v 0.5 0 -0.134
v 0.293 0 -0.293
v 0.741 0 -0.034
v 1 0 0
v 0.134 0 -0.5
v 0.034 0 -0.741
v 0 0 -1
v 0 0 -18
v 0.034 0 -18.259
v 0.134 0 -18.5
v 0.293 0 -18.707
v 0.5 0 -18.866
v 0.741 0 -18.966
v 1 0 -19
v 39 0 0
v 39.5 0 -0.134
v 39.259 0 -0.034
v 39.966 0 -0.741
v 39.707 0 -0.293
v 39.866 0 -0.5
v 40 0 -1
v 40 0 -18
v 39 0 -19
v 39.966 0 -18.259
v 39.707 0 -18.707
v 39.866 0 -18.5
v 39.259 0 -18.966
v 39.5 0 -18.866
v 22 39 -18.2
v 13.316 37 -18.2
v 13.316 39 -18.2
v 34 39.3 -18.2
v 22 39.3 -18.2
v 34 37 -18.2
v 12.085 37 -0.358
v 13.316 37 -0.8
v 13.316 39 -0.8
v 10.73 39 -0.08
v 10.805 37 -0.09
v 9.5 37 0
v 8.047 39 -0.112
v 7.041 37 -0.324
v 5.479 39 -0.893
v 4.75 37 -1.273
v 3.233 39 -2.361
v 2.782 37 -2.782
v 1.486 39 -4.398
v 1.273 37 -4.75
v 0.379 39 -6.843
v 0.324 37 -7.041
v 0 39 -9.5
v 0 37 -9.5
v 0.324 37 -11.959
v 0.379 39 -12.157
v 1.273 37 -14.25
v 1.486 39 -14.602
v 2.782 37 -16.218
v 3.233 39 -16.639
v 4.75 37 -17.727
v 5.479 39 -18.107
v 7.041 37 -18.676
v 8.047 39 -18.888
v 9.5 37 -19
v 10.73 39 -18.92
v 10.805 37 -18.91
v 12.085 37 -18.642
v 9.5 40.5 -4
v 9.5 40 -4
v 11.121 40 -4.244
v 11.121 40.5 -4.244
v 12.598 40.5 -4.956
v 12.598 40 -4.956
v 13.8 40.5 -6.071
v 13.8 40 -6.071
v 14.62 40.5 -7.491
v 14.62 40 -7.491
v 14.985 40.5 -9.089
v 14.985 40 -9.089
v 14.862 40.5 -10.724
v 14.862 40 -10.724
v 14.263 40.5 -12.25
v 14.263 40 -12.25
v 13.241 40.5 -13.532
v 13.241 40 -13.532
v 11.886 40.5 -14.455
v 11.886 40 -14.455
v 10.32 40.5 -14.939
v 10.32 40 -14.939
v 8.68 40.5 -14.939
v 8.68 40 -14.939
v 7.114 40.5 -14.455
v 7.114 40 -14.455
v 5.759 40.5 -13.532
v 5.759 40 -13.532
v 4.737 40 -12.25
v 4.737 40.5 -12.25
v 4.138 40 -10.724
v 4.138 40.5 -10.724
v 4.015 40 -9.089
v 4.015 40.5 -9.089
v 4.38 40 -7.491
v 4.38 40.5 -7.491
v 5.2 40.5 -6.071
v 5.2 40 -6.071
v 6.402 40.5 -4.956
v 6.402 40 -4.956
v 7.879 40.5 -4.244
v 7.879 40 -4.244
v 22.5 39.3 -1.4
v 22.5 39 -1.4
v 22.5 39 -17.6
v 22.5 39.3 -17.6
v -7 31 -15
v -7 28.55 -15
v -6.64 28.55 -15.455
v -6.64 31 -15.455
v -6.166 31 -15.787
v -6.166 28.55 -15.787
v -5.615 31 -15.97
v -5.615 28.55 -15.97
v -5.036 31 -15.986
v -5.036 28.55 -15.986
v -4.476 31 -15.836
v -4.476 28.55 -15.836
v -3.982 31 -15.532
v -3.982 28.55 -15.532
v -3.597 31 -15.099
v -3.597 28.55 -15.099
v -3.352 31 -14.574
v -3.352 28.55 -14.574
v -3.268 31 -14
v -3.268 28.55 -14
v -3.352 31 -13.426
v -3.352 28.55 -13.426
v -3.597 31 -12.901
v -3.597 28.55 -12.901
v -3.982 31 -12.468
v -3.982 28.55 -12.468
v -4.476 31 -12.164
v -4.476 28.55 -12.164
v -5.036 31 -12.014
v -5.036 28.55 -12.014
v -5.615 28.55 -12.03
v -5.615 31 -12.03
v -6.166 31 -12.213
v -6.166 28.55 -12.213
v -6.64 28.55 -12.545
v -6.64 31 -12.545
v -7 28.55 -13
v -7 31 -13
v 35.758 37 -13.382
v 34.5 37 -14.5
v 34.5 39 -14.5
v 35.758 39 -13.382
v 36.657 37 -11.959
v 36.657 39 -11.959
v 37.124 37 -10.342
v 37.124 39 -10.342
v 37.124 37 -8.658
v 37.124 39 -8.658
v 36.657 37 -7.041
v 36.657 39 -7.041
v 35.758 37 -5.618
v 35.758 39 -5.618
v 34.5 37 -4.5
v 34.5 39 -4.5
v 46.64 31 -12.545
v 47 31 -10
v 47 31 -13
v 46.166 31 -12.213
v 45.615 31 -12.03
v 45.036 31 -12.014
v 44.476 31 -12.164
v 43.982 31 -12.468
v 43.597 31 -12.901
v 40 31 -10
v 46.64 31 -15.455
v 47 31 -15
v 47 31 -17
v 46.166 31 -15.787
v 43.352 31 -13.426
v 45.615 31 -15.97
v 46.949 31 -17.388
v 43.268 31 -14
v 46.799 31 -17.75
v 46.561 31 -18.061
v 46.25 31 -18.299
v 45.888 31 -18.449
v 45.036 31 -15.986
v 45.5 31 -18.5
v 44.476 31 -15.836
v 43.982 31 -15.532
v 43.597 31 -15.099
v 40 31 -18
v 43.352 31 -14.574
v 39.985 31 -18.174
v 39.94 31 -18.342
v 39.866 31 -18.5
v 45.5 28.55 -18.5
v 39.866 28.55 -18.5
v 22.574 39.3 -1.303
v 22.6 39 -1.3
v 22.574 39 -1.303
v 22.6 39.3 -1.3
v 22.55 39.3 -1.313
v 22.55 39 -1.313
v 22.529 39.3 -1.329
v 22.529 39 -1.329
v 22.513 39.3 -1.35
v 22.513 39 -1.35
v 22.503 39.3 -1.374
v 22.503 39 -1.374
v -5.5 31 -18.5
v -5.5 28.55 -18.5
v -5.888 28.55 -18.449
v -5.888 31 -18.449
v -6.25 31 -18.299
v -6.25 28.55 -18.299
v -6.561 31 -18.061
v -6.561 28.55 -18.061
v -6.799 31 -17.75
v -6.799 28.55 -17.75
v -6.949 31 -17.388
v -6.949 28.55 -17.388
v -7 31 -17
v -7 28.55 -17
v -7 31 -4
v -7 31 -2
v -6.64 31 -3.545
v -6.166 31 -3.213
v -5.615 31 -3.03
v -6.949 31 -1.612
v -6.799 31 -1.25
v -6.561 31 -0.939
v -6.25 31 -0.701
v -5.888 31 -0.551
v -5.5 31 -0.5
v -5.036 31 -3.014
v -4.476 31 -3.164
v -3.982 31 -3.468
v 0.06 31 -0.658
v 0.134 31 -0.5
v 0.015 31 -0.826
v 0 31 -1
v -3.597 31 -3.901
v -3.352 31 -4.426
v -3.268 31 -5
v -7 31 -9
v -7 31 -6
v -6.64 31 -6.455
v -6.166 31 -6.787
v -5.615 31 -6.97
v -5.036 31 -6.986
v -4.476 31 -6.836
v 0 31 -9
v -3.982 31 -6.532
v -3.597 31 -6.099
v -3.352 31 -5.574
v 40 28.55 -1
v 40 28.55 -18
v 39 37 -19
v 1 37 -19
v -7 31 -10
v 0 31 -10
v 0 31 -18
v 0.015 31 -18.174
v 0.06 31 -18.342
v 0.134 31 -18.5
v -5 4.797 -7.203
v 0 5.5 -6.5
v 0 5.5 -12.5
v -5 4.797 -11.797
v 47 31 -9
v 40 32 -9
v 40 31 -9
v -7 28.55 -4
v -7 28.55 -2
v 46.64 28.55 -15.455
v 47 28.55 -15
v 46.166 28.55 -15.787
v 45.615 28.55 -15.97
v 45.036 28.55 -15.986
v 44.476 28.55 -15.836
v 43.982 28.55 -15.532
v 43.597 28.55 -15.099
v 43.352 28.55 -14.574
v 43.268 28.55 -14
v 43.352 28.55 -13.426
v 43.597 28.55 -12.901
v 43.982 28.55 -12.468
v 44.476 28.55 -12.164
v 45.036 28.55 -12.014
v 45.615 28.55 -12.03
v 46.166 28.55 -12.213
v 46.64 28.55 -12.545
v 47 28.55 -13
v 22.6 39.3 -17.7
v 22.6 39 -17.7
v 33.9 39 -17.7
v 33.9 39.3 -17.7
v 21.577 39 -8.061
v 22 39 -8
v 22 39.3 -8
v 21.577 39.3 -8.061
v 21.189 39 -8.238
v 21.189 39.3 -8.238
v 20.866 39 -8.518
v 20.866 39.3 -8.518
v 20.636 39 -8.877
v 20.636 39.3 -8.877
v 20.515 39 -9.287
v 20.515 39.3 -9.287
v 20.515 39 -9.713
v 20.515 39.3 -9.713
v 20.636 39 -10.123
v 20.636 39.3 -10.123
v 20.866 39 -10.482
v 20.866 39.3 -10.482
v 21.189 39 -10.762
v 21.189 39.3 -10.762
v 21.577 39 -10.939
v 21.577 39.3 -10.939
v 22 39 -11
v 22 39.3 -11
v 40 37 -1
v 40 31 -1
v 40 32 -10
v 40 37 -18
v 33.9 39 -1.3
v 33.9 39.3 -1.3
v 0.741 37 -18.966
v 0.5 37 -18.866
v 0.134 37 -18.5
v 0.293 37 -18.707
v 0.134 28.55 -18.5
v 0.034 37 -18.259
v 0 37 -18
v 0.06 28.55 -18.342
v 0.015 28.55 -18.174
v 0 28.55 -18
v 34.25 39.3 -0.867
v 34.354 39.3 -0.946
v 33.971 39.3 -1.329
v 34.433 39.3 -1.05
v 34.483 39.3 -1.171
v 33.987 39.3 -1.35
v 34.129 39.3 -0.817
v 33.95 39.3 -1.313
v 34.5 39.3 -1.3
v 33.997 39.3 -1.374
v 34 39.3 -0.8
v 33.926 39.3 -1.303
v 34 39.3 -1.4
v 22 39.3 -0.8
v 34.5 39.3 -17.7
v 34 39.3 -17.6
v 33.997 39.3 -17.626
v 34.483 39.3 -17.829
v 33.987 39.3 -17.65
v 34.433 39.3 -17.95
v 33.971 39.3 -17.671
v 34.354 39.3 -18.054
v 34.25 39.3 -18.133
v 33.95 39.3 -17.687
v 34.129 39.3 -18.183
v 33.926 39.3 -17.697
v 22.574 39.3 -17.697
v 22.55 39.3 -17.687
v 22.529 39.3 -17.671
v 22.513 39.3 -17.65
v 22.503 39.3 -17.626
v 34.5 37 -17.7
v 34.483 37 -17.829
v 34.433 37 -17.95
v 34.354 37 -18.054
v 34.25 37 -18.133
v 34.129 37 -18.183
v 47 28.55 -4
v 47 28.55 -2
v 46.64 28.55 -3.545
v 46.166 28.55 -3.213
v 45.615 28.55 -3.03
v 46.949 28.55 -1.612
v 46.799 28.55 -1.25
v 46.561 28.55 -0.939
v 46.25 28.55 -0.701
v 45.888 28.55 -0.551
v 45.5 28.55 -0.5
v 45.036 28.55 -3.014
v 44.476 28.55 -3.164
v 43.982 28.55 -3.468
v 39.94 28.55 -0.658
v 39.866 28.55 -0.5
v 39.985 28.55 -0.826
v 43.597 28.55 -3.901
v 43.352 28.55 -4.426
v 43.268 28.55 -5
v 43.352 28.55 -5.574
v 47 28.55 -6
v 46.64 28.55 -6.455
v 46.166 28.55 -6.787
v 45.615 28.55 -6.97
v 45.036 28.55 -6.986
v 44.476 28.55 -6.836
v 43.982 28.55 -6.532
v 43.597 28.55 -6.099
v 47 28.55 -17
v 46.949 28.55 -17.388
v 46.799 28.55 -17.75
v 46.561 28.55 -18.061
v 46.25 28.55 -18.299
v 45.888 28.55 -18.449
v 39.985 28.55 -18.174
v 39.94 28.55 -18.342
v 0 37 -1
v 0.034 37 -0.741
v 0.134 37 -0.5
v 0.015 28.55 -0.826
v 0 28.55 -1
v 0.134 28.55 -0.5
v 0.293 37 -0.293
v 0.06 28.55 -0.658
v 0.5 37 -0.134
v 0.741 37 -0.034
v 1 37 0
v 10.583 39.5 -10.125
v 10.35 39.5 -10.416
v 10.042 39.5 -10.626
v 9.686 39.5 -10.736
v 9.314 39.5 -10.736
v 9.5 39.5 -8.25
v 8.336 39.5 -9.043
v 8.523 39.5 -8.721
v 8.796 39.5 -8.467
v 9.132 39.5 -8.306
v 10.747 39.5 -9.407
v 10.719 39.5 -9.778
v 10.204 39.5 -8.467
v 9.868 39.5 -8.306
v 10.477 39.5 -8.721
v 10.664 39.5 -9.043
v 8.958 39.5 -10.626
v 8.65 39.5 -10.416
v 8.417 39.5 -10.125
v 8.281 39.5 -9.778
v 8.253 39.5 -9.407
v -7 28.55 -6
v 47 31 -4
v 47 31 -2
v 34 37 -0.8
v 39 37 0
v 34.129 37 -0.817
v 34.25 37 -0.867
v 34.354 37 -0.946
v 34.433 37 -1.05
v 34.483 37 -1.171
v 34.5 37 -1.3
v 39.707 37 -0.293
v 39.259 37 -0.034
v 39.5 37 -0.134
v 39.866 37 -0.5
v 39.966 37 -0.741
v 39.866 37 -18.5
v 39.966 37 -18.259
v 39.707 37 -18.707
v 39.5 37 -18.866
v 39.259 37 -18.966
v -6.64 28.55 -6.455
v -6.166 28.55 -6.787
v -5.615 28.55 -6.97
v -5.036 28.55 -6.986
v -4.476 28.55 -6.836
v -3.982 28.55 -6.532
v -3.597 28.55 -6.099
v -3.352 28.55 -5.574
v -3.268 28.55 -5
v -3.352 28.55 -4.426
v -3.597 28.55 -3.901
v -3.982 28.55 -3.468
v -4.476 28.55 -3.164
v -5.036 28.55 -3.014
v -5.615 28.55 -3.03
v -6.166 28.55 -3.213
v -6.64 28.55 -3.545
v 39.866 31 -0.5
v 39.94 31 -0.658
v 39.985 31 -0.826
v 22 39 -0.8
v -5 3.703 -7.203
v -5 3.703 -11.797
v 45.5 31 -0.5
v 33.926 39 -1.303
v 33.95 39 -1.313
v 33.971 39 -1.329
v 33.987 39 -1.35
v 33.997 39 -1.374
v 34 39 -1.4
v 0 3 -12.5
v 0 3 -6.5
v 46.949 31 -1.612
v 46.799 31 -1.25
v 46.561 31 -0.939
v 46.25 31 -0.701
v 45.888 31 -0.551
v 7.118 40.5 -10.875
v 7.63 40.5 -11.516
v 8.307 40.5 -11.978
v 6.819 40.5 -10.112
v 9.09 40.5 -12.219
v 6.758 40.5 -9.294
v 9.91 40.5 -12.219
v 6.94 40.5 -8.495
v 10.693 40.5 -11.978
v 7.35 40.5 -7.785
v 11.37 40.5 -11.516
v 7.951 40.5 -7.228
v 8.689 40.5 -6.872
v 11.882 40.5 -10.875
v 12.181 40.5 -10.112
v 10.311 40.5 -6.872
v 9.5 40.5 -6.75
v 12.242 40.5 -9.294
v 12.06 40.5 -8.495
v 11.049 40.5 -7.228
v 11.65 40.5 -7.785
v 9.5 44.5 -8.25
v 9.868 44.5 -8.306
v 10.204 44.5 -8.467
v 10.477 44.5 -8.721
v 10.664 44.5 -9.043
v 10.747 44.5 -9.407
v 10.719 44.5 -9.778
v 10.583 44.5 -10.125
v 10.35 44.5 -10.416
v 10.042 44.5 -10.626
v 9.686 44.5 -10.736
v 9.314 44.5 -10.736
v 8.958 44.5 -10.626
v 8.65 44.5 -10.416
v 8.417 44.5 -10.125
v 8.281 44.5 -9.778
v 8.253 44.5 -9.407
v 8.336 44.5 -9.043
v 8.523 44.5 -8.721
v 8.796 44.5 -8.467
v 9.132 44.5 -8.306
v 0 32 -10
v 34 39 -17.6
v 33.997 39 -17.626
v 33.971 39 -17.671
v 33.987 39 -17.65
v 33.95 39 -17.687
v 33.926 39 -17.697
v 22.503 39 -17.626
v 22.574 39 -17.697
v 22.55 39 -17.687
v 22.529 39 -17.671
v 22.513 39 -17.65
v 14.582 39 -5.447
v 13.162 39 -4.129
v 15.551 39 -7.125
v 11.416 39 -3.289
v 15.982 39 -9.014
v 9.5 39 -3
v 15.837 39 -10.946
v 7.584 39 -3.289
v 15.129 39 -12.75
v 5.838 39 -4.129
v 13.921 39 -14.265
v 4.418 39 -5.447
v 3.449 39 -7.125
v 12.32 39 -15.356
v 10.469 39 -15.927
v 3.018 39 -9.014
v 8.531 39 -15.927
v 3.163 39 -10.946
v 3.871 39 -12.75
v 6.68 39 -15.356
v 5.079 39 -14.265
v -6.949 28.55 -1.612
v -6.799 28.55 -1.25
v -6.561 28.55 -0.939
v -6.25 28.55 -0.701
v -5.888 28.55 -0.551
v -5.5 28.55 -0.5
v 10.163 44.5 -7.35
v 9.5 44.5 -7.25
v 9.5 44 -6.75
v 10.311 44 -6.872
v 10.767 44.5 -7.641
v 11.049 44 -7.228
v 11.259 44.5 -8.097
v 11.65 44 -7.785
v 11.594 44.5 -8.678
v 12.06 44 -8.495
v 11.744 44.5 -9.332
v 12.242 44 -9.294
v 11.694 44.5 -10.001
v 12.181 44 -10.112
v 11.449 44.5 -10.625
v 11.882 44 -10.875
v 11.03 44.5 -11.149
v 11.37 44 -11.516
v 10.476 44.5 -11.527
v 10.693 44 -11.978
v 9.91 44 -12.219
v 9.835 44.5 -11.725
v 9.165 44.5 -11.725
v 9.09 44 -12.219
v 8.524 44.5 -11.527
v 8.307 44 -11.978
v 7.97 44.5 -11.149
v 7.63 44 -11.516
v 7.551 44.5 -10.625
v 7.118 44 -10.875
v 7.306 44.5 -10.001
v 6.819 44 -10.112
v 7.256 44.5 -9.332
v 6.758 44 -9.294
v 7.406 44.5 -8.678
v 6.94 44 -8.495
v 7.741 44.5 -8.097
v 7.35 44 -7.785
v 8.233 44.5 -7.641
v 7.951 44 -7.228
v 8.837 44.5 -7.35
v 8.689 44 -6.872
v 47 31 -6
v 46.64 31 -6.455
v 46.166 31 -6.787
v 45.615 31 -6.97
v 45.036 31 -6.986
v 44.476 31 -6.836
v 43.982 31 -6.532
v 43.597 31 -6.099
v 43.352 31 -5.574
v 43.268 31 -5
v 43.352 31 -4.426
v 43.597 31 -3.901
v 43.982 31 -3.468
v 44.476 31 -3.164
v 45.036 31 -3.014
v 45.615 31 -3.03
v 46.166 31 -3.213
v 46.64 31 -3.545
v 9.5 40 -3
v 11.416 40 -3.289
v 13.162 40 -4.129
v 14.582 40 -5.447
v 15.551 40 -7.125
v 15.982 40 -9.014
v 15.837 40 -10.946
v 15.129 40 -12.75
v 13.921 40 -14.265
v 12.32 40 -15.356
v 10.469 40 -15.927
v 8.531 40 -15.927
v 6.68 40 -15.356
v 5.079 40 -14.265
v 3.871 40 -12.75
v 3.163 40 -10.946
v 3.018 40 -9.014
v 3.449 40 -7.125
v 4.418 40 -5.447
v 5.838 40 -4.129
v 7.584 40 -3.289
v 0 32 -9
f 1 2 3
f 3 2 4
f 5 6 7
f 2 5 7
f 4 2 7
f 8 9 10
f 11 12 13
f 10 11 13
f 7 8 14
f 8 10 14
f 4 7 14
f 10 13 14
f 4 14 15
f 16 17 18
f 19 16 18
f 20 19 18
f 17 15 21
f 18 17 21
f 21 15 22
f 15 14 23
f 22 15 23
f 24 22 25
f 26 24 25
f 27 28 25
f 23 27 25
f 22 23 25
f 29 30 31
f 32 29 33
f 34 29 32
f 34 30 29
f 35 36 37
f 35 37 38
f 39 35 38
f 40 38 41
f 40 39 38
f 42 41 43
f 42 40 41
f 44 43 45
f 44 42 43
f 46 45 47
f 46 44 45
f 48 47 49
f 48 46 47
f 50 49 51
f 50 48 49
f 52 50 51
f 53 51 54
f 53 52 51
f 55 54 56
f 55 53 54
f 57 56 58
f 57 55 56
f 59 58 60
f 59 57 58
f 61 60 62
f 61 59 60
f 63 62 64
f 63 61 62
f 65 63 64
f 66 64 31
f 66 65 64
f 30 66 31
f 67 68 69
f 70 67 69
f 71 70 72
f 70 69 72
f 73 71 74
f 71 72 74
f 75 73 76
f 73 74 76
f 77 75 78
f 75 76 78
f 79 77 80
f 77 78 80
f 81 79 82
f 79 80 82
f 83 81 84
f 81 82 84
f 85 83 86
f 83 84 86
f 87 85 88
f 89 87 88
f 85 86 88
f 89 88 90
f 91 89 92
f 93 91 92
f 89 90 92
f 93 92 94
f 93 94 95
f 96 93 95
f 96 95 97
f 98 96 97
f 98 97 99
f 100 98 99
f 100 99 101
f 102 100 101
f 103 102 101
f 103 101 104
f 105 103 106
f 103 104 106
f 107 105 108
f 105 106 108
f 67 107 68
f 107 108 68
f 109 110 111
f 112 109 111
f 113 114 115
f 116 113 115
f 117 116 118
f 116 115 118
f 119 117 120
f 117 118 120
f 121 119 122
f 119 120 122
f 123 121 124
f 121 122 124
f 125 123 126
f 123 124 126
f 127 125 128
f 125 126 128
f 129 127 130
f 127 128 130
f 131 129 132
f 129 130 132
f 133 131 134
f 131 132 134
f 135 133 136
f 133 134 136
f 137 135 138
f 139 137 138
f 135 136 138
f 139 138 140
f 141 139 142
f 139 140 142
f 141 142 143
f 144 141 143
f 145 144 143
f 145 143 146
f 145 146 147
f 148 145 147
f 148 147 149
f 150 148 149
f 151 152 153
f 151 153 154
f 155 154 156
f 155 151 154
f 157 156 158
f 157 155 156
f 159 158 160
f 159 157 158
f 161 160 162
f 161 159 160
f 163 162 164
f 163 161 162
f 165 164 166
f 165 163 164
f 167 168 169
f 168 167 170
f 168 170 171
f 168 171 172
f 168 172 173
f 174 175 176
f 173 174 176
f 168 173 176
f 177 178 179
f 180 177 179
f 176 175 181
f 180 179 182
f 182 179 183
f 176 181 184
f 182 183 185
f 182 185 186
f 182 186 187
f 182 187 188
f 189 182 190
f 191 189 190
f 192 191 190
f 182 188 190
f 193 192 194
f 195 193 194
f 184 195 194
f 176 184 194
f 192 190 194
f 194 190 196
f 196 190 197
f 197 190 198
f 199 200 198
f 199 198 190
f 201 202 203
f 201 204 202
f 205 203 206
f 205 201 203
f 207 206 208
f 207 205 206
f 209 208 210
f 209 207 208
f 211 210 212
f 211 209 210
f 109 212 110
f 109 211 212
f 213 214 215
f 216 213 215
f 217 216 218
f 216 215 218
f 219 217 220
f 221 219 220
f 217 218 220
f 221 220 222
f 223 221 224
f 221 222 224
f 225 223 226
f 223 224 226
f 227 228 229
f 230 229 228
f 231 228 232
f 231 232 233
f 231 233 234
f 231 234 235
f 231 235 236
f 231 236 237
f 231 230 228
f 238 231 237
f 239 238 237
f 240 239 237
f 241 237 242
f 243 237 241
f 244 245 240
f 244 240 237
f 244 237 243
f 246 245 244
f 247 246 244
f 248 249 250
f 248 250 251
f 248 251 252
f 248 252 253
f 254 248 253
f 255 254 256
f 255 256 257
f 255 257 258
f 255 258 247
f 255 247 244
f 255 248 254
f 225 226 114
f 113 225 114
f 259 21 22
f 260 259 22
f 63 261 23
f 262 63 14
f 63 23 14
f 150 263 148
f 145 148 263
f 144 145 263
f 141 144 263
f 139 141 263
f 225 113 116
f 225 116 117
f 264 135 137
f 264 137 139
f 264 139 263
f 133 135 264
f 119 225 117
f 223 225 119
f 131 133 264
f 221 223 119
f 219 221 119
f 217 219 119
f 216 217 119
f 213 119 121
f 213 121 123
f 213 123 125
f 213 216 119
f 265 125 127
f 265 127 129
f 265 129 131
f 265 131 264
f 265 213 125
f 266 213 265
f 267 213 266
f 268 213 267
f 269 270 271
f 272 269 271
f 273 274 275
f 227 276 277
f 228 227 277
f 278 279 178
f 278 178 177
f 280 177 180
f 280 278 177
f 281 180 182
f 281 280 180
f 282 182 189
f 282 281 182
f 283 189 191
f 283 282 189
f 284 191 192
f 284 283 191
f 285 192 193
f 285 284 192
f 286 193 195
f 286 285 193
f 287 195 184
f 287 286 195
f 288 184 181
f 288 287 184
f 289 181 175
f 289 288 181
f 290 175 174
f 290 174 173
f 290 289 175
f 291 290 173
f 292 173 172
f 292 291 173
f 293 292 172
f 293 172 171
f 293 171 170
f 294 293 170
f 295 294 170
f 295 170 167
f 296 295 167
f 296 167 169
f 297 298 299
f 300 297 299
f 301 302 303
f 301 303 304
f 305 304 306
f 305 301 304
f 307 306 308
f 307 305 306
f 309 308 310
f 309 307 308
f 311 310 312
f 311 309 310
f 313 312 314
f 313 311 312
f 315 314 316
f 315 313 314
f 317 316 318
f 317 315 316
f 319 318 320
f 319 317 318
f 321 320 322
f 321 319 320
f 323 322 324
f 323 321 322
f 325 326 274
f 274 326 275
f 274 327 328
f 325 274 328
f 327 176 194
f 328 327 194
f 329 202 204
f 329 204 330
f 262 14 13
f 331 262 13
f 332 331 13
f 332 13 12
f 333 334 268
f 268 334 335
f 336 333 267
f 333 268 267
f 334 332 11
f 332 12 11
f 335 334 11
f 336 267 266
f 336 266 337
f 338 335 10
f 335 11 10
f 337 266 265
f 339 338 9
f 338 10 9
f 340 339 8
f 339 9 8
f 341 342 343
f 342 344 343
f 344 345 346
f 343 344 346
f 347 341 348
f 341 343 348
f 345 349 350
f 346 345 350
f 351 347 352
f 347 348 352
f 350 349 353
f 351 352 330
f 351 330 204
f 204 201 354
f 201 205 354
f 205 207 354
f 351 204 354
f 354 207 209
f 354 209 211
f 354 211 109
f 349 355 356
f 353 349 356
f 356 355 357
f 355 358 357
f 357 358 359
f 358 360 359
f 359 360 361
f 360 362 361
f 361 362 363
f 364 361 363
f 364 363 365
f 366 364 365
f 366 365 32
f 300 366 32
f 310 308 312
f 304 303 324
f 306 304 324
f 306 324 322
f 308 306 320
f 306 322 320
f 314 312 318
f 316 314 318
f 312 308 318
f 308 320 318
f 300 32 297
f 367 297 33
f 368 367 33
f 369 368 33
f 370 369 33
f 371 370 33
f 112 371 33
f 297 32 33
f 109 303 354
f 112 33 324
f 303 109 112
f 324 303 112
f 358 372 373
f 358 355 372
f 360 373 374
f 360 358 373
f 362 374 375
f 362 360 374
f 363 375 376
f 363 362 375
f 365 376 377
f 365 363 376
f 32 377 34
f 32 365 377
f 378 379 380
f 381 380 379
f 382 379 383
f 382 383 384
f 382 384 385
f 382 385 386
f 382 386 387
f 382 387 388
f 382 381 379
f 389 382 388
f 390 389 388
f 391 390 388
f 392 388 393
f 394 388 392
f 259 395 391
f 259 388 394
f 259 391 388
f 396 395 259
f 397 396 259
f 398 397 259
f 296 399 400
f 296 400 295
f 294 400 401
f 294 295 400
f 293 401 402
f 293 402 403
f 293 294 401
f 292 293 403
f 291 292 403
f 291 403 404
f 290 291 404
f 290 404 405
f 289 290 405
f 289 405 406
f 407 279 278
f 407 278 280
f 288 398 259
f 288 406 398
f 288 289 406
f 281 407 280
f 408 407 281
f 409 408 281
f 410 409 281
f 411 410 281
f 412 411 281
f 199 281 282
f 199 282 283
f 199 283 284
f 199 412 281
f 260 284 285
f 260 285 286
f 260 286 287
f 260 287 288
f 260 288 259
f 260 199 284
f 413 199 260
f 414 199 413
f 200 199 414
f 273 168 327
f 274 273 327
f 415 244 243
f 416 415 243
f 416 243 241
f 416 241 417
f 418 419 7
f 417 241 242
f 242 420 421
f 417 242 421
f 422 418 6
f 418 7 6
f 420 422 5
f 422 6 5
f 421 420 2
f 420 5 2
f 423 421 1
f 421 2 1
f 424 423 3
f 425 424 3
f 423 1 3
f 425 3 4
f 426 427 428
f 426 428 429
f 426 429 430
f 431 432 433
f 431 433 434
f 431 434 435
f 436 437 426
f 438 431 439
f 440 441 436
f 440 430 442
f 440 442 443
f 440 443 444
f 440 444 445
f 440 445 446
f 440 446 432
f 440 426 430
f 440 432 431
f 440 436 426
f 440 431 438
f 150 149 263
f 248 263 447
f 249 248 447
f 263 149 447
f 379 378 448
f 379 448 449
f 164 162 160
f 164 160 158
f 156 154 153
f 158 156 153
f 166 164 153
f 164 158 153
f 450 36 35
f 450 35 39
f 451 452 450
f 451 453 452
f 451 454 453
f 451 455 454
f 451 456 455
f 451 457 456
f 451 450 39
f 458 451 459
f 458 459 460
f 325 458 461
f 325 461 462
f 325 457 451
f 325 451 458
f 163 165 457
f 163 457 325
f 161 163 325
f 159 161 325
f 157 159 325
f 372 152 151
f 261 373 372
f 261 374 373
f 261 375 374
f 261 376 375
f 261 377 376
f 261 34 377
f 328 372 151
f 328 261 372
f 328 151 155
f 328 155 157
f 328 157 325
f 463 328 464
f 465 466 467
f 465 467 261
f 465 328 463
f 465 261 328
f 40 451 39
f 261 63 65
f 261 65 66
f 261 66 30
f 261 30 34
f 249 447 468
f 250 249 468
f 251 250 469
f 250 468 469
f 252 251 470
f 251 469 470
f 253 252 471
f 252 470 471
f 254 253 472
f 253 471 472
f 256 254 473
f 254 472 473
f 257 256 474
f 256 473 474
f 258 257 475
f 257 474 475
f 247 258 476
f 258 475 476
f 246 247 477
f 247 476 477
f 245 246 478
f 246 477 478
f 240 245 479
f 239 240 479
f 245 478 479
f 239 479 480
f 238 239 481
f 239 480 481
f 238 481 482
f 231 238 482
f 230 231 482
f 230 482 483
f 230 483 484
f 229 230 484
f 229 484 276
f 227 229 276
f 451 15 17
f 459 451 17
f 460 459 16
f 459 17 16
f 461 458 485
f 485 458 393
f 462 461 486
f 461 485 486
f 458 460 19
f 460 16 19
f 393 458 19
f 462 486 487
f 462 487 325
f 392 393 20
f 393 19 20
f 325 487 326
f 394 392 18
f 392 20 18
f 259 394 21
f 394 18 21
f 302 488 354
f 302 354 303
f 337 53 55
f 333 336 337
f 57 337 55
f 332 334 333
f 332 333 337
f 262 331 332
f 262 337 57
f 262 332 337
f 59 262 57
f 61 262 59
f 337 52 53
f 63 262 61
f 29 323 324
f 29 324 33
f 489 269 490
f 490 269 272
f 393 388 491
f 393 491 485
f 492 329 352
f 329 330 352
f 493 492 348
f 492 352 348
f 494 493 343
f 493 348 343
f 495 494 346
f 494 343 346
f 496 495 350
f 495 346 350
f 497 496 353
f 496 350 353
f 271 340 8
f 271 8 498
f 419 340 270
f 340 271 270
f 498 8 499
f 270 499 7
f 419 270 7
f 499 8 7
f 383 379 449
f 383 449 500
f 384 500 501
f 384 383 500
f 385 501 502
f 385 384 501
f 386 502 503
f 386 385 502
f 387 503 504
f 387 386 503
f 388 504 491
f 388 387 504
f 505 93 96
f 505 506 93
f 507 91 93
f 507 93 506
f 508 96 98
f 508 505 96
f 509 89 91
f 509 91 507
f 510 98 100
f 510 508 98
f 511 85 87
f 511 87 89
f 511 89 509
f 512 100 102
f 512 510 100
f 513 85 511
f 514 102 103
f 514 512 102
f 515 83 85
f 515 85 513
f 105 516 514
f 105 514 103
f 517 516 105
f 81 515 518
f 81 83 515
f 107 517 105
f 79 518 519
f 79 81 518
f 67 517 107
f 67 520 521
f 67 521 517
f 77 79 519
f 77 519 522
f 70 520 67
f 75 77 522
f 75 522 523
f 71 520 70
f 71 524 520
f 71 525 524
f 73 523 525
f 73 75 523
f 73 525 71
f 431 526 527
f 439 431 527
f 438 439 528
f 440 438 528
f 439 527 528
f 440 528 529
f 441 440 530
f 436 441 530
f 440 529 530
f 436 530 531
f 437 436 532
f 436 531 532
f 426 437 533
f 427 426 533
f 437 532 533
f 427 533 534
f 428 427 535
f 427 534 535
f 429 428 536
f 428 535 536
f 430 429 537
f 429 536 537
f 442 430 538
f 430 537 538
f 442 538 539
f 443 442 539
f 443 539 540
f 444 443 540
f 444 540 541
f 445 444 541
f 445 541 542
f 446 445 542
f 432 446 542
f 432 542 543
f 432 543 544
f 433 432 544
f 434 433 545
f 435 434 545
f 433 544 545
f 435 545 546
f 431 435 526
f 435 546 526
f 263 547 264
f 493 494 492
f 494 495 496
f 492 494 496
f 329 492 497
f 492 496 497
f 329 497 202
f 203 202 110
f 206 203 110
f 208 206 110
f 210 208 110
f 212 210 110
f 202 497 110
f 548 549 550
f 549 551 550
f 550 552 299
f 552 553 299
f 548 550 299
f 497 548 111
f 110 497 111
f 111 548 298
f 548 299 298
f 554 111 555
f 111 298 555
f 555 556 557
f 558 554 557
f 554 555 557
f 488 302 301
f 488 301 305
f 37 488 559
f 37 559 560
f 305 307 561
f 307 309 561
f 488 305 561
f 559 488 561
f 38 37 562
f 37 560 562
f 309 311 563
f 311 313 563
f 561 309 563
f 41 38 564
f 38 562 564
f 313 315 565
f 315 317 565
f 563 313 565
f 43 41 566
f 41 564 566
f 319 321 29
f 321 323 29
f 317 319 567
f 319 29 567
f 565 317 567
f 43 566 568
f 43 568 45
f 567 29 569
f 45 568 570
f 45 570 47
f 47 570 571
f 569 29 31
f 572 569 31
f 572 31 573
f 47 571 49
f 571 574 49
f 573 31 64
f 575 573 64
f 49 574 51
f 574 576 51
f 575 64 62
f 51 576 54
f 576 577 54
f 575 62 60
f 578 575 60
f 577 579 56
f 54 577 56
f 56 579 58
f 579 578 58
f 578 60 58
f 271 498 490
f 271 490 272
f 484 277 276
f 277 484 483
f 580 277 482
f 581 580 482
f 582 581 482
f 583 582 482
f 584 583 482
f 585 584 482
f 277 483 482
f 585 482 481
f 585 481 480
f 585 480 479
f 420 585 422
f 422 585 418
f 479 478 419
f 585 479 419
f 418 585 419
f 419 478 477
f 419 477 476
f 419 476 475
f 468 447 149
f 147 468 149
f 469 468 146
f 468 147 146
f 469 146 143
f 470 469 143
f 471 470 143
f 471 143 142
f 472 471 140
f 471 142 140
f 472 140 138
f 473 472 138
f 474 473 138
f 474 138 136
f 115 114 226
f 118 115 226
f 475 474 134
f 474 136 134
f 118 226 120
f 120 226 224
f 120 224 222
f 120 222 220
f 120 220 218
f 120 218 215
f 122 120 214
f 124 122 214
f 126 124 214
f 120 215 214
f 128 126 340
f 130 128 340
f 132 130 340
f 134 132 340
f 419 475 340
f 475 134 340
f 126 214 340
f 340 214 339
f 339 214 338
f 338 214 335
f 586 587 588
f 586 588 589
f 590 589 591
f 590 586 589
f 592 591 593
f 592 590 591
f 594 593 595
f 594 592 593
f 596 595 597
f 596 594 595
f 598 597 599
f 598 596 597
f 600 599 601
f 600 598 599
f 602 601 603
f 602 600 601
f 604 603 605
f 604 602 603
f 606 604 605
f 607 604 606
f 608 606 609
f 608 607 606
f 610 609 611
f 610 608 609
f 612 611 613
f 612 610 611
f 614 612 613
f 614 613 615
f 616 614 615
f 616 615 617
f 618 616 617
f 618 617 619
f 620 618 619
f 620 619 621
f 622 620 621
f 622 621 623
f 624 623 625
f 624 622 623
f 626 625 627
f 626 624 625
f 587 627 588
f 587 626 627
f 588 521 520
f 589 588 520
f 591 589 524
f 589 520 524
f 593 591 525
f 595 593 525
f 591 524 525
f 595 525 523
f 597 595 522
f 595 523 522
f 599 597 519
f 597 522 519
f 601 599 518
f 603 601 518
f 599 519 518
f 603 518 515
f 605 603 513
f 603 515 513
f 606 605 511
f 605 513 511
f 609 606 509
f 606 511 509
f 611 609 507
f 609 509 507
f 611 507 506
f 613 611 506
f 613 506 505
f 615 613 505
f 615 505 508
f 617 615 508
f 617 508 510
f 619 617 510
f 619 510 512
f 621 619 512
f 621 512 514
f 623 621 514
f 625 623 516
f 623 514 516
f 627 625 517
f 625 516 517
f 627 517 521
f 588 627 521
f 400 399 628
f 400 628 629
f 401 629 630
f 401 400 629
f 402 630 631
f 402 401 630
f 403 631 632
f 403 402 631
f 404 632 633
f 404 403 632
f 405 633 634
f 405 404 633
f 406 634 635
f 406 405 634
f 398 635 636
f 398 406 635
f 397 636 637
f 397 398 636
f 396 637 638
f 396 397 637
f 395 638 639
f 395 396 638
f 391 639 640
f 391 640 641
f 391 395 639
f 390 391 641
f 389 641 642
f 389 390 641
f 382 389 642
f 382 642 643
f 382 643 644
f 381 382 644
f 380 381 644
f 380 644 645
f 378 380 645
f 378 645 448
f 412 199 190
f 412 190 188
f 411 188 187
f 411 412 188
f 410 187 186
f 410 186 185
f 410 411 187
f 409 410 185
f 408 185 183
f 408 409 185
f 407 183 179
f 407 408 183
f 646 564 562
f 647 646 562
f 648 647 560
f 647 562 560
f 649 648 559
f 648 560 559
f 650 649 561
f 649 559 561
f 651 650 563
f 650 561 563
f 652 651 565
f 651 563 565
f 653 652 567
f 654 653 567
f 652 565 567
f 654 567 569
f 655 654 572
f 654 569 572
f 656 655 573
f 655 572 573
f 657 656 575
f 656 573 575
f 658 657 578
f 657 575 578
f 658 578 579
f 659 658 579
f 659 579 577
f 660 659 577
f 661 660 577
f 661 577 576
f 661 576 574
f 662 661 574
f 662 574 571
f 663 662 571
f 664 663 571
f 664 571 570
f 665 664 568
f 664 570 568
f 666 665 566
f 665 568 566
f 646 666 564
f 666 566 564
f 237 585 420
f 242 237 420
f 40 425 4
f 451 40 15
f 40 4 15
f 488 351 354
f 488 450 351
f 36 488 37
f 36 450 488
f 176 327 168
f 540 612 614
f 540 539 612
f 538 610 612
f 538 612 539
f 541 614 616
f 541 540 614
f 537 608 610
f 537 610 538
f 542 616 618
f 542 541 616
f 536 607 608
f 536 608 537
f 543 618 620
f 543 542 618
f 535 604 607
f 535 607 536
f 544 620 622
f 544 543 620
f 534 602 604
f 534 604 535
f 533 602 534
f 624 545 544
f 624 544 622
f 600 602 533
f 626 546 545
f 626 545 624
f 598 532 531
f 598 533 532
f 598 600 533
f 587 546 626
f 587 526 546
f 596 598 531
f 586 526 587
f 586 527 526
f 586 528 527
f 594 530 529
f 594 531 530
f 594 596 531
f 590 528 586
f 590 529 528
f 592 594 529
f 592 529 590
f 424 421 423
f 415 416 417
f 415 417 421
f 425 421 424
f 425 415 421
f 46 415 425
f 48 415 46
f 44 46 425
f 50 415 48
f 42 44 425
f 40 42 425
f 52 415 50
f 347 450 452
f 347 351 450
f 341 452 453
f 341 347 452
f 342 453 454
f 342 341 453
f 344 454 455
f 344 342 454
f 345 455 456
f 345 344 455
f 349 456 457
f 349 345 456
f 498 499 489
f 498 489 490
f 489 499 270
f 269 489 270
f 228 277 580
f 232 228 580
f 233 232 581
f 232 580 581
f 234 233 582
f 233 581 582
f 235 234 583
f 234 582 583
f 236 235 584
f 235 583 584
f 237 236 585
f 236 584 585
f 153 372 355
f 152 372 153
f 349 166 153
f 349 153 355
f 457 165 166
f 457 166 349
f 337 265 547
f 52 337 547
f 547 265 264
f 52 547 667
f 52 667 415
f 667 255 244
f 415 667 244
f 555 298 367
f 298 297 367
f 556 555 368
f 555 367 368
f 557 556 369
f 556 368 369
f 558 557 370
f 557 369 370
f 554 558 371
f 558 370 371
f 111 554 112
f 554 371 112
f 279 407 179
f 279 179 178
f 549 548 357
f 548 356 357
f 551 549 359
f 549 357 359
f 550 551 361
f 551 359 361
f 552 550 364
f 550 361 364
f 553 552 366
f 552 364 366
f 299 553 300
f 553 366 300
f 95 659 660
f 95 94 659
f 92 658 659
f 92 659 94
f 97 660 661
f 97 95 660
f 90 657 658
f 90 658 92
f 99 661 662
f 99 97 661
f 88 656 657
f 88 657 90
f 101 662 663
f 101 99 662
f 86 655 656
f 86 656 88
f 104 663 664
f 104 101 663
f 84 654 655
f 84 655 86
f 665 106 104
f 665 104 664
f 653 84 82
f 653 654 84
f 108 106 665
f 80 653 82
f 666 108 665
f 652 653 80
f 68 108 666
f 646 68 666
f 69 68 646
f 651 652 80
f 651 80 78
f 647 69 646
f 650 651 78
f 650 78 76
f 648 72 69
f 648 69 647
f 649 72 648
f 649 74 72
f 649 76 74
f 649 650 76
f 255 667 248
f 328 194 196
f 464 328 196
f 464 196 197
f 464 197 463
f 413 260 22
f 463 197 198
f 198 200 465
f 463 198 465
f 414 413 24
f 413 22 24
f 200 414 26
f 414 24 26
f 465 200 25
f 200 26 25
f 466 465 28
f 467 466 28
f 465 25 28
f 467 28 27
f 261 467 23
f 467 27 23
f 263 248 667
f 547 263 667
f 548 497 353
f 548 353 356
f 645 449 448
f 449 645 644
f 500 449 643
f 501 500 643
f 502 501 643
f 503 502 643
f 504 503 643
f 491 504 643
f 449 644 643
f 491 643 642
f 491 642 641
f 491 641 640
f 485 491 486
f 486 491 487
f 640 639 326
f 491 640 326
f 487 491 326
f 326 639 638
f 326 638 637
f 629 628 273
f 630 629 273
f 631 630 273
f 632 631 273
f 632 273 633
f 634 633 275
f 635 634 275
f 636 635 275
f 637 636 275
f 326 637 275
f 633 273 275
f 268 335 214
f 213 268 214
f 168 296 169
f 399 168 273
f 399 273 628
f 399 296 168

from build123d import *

# Parameters (mm, degrees)
SALIENTE_EXTRUIR1_DEPTH = 37
SALIENTE_EXTRUIR2_DEPTH = 2
CROQUIS3_R              = 6.5
SALIENTE_EXTRUIR3_DEPTH = 1
CROQUIS4_R              = 5.5
SALIENTE_EXTRUIR4_DEPTH = 0.5
CROQUIS5_R              = 2.75
SALIENTE_EXTRUIR5_DEPTH = 4
CROQUIS7_W              = 11.5
CROQUIS7_H              = 16.4
SALIENTE_EXTRUIR6_DEPTH = 0.3
REDONDEO1_R             = 0.1
REDONDEO2_R             = 0.5
SALIENTE_EXTRUIR7_START = -8.45
SALIENTE_EXTRUIR7_DEPTH = 2.45
SALIENTE_EXTRUIR8_DEPTH = 0.5
CROQUIS11_W             = 6
CROQUIS11_H             = 2.5
SALIENTE_EXTRUIR9_DEPTH = 5
SALIENTE_EXTRUIR9_DRAFT = -8
CROQUIS12_R             = 1.25
CORTAR_EXTRUIR1_DEPTH   = 5
CHAFL_N1_SIZE           = 0.5


with BuildPart() as part:
    # Croquis1 → Saliente-Extruir1 (new body)
    with BuildSketch(Plane(origin=(0, 0, 0), x_dir=(1, 0, 0), z_dir=(0, 1, 0))):
        with BuildLine():
            Line((1, 0), (39, 0))
            ThreePointArc((39, 0), (39.707106781, 0.292893219), (40, 1))
            Line((40, 1), (40, 18))
            ThreePointArc((40, 18), (39.707106781, 18.707106781), (39, 19))
            Line((39, 19), (1, 19))
            ThreePointArc((1, 19), (0.292893219, 18.707106781), (0, 18))
            Line((0, 18), (0, 1))
            ThreePointArc((0, 1), (0.292893219, 0.292893219), (1, 0))
        make_face()
    extrude(amount=SALIENTE_EXTRUIR1_DEPTH)

    # Croquis2 → Saliente-Extruir2 (add)
    with BuildSketch(Plane(origin=(0, 37, 0), x_dir=(1, 0, 0), z_dir=(0, 1, 0))):
        with BuildLine():
            Line((13.315756806, 18.2), (34.5, 18.2))
            Line((34.5, 18.2), (34.5, 14.5))
            ThreePointArc((34.5, 14.5), (37.18337521, 9.5), (34.5, 4.5))
            Line((34.5, 4.5), (34.5, 0.8))
            Line((34.5, 0.8), (13.315756806, 0.8))
            ThreePointArc((13.315756806, 0.8), (0, 9.5), (13.315756806, 18.2))
        make_face()
    extrude(amount=SALIENTE_EXTRUIR2_DEPTH)

    # Croquis3 → Saliente-Extruir3 (add)
    with BuildSketch(Plane(origin=(0, 39, 0), x_dir=(1, 0, 0), z_dir=(0, 1, 0))):
        with Locations(Location((9.5, 9.5, 0), (0, 0, 270))):
            Circle(CROQUIS3_R)
    extrude(amount=SALIENTE_EXTRUIR3_DEPTH)

    # Croquis4 → Saliente-Extruir4 (add)
    with BuildSketch(Plane(origin=(0, 40, 0), x_dir=(1, 0, 0), z_dir=(0, 1, 0))):
        with Locations(Location((9.5, 9.5, 0), (0, 0, 270))):
            Circle(CROQUIS4_R)
    extrude(amount=SALIENTE_EXTRUIR4_DEPTH)

    # Croquis5 → Saliente-Extruir5 (add)
    with BuildSketch(Plane(origin=(0, 40.5, 0), x_dir=(1, 0, 0), z_dir=(0, 1, 0))):
        with Locations(Location((9.5, 9.5, 0), (0, 0, 270))):
            Circle(CROQUIS5_R)
    extrude(amount=SALIENTE_EXTRUIR5_DEPTH)

    # Croquis7 → Saliente-Extruir6 (add)
    with BuildSketch(Plane(origin=(0, 39, 0), x_dir=(1, 0, 0), z_dir=(0, 1, 0))):
        with BuildLine():
            Line((34.5, 0.8), (22, 0.8))
            Line((22, 0.8), (22, 8))
            ThreePointArc((22, 8), (20.5, 9.5), (22, 11))
            Line((22, 11), (22, 18.2))
            Line((22, 18.2), (34.5, 18.2))
            Line((34.5, 18.2), (34.5, 0.8))
        make_face()
        with Locations((28.25, 9.5)):
            Rectangle(CROQUIS7_W, CROQUIS7_H, mode=Mode.SUBTRACT)
    extrude(amount=SALIENTE_EXTRUIR6_DEPTH)

    # Redondeo1
    redondeo1_edges = [part.edges().sort_by_distance(p)[0] for p in [
        (34, 39.15, -1.3),
        (34, 39.15, -17.7),
        (22.5, 39.15, -17.7),
        (22.5, 39.15, -1.3),
    ]]
    fillet(redondeo1_edges, radius=REDONDEO1_R)

    # Redondeo2
    redondeo2_edges = [part.edges().sort_by_distance(p)[0] for p in [
        (34.5, 38.15, -0.8),
        (34.5, 38.15, -18.2),
    ]]
    fillet(redondeo2_edges, radius=REDONDEO2_R)

    # Croquis8 → Saliente-Extruir7 (add)
    with BuildSketch(Plane(origin=(0, 37, 0), x_dir=(1, 0, 0), z_dir=(0, 1, 0)).offset(SALIENTE_EXTRUIR7_START)):
        with BuildLine():
            Line((40, 1), (40, 18))
            ThreePointArc((40, 18), (39.965925826, 18.258819045), (39.866025404, 18.5))
            Line((39.866025404, 18.5), (45.5, 18.5))
            ThreePointArc((45.5, 18.5), (46.560660172, 18.060660172), (47, 17))
            Line((47, 17), (47, 15))
            ThreePointArc((47, 15), (43.267949192, 14), (47, 13))
            Line((47, 13), (47, 6))
            ThreePointArc((47, 6), (43.267949192, 5), (47, 4))
            Line((47, 4), (47, 2))
            ThreePointArc((47, 2), (46.560660172, 0.939339828), (45.5, 0.5))
            Line((45.5, 0.5), (39.866025404, 0.5))
            ThreePointArc((39.866025404, 0.5), (39.965925826, 0.741180955), (40, 1))
        make_face()
        with BuildLine():
            Line((-7, 17), (-7, 15))
            ThreePointArc((-7, 15), (-3.267949192, 14), (-7, 13))
            Line((-7, 13), (-7, 6))
            ThreePointArc((-7, 6), (-3.267949192, 5), (-7, 4))
            Line((-7, 4), (-7, 2))
            ThreePointArc((-7, 2), (-6.560660172, 0.939339828), (-5.5, 0.5))
            Line((-5.5, 0.5), (0.133974596, 0.5))
            ThreePointArc((0.133974596, 0.5), (0.034074174, 0.741180955), (0, 1))
            Line((0, 1), (0, 18))
            ThreePointArc((0, 18), (0.034074174, 18.258819045), (0.133974596, 18.5))
            Line((0.133974596, 18.5), (-5.5, 18.5))
            ThreePointArc((-5.5, 18.5), (-6.560660172, 18.060660172), (-7, 17))
        make_face()
    extrude(amount=SALIENTE_EXTRUIR7_DEPTH)

    # Croquis10 → Saliente-Extruir8 (add, symmetric)
    with BuildSketch(Plane.XY.offset(-9.5)):
        Polygon((47, 31), (40, 32), (40, 31), align=None)
        Polygon((0, 32), (0, 31), (-7, 31), align=None)
    extrude(amount=SALIENTE_EXTRUIR8_DEPTH, both=True)


with BuildPart() as saliente_extruir9_tool:
    # Croquis11 → Saliente-Extruir9 (with draft: the straight prism first)
    with BuildSketch(Plane(origin=(0, 0, 0), x_dir=(0, 0, -1), z_dir=(1, 0, 0))):
        with Locations((9.5, 4.25)):
            Rectangle(CROQUIS11_W, CROQUIS11_H)
    extrude(amount=-SALIENTE_EXTRUIR9_DEPTH)
    # Saliente-Extruir9: the draft: its side faces are tilted about the plane it starts from
    saliente_extruir9_sides = [saliente_extruir9_tool.faces().sort_by_distance(p)[0] for p in [
        (-2.5, 4.25, -6.5),
        (-2.5, 3, -9.5),
        (-2.5, 4.25, -12.5),
        (-2.5, 5.5, -9.5),
    ]]
    draft(saliente_extruir9_sides, Plane(origin=(0, 0, 0), x_dir=(0, 0, -1), z_dir=(1, 0, 0)), SALIENTE_EXTRUIR9_DRAFT)


with BuildPart() as part_1:
    add(part.part)

    # Saliente-Extruir9: add saliente_extruir9_tool
    add(saliente_extruir9_tool.part)

    # Croquis12 → Cortar-Extruir1 (cut)
    with BuildSketch(Plane(origin=(0, 44.5, 0), x_dir=(1, 0, 0), z_dir=(0, 1, 0))):
        with Locations(Location((9.5, 9.5, 0), (0, 0, 270))):
            Circle(CROQUIS12_R)
    extrude(amount=-CORTAR_EXTRUIR1_DEPTH, mode=Mode.SUBTRACT)

    # Chaflán1
    chafl_n1_edges = [part_1.edges().sort_by_distance(p)[0] for p in [
        (9.5, 44.5, -12.25),
    ]]
    chamfer(chafl_n1_edges, length=CHAFL_N1_SIZE)


solid = part_1.part
